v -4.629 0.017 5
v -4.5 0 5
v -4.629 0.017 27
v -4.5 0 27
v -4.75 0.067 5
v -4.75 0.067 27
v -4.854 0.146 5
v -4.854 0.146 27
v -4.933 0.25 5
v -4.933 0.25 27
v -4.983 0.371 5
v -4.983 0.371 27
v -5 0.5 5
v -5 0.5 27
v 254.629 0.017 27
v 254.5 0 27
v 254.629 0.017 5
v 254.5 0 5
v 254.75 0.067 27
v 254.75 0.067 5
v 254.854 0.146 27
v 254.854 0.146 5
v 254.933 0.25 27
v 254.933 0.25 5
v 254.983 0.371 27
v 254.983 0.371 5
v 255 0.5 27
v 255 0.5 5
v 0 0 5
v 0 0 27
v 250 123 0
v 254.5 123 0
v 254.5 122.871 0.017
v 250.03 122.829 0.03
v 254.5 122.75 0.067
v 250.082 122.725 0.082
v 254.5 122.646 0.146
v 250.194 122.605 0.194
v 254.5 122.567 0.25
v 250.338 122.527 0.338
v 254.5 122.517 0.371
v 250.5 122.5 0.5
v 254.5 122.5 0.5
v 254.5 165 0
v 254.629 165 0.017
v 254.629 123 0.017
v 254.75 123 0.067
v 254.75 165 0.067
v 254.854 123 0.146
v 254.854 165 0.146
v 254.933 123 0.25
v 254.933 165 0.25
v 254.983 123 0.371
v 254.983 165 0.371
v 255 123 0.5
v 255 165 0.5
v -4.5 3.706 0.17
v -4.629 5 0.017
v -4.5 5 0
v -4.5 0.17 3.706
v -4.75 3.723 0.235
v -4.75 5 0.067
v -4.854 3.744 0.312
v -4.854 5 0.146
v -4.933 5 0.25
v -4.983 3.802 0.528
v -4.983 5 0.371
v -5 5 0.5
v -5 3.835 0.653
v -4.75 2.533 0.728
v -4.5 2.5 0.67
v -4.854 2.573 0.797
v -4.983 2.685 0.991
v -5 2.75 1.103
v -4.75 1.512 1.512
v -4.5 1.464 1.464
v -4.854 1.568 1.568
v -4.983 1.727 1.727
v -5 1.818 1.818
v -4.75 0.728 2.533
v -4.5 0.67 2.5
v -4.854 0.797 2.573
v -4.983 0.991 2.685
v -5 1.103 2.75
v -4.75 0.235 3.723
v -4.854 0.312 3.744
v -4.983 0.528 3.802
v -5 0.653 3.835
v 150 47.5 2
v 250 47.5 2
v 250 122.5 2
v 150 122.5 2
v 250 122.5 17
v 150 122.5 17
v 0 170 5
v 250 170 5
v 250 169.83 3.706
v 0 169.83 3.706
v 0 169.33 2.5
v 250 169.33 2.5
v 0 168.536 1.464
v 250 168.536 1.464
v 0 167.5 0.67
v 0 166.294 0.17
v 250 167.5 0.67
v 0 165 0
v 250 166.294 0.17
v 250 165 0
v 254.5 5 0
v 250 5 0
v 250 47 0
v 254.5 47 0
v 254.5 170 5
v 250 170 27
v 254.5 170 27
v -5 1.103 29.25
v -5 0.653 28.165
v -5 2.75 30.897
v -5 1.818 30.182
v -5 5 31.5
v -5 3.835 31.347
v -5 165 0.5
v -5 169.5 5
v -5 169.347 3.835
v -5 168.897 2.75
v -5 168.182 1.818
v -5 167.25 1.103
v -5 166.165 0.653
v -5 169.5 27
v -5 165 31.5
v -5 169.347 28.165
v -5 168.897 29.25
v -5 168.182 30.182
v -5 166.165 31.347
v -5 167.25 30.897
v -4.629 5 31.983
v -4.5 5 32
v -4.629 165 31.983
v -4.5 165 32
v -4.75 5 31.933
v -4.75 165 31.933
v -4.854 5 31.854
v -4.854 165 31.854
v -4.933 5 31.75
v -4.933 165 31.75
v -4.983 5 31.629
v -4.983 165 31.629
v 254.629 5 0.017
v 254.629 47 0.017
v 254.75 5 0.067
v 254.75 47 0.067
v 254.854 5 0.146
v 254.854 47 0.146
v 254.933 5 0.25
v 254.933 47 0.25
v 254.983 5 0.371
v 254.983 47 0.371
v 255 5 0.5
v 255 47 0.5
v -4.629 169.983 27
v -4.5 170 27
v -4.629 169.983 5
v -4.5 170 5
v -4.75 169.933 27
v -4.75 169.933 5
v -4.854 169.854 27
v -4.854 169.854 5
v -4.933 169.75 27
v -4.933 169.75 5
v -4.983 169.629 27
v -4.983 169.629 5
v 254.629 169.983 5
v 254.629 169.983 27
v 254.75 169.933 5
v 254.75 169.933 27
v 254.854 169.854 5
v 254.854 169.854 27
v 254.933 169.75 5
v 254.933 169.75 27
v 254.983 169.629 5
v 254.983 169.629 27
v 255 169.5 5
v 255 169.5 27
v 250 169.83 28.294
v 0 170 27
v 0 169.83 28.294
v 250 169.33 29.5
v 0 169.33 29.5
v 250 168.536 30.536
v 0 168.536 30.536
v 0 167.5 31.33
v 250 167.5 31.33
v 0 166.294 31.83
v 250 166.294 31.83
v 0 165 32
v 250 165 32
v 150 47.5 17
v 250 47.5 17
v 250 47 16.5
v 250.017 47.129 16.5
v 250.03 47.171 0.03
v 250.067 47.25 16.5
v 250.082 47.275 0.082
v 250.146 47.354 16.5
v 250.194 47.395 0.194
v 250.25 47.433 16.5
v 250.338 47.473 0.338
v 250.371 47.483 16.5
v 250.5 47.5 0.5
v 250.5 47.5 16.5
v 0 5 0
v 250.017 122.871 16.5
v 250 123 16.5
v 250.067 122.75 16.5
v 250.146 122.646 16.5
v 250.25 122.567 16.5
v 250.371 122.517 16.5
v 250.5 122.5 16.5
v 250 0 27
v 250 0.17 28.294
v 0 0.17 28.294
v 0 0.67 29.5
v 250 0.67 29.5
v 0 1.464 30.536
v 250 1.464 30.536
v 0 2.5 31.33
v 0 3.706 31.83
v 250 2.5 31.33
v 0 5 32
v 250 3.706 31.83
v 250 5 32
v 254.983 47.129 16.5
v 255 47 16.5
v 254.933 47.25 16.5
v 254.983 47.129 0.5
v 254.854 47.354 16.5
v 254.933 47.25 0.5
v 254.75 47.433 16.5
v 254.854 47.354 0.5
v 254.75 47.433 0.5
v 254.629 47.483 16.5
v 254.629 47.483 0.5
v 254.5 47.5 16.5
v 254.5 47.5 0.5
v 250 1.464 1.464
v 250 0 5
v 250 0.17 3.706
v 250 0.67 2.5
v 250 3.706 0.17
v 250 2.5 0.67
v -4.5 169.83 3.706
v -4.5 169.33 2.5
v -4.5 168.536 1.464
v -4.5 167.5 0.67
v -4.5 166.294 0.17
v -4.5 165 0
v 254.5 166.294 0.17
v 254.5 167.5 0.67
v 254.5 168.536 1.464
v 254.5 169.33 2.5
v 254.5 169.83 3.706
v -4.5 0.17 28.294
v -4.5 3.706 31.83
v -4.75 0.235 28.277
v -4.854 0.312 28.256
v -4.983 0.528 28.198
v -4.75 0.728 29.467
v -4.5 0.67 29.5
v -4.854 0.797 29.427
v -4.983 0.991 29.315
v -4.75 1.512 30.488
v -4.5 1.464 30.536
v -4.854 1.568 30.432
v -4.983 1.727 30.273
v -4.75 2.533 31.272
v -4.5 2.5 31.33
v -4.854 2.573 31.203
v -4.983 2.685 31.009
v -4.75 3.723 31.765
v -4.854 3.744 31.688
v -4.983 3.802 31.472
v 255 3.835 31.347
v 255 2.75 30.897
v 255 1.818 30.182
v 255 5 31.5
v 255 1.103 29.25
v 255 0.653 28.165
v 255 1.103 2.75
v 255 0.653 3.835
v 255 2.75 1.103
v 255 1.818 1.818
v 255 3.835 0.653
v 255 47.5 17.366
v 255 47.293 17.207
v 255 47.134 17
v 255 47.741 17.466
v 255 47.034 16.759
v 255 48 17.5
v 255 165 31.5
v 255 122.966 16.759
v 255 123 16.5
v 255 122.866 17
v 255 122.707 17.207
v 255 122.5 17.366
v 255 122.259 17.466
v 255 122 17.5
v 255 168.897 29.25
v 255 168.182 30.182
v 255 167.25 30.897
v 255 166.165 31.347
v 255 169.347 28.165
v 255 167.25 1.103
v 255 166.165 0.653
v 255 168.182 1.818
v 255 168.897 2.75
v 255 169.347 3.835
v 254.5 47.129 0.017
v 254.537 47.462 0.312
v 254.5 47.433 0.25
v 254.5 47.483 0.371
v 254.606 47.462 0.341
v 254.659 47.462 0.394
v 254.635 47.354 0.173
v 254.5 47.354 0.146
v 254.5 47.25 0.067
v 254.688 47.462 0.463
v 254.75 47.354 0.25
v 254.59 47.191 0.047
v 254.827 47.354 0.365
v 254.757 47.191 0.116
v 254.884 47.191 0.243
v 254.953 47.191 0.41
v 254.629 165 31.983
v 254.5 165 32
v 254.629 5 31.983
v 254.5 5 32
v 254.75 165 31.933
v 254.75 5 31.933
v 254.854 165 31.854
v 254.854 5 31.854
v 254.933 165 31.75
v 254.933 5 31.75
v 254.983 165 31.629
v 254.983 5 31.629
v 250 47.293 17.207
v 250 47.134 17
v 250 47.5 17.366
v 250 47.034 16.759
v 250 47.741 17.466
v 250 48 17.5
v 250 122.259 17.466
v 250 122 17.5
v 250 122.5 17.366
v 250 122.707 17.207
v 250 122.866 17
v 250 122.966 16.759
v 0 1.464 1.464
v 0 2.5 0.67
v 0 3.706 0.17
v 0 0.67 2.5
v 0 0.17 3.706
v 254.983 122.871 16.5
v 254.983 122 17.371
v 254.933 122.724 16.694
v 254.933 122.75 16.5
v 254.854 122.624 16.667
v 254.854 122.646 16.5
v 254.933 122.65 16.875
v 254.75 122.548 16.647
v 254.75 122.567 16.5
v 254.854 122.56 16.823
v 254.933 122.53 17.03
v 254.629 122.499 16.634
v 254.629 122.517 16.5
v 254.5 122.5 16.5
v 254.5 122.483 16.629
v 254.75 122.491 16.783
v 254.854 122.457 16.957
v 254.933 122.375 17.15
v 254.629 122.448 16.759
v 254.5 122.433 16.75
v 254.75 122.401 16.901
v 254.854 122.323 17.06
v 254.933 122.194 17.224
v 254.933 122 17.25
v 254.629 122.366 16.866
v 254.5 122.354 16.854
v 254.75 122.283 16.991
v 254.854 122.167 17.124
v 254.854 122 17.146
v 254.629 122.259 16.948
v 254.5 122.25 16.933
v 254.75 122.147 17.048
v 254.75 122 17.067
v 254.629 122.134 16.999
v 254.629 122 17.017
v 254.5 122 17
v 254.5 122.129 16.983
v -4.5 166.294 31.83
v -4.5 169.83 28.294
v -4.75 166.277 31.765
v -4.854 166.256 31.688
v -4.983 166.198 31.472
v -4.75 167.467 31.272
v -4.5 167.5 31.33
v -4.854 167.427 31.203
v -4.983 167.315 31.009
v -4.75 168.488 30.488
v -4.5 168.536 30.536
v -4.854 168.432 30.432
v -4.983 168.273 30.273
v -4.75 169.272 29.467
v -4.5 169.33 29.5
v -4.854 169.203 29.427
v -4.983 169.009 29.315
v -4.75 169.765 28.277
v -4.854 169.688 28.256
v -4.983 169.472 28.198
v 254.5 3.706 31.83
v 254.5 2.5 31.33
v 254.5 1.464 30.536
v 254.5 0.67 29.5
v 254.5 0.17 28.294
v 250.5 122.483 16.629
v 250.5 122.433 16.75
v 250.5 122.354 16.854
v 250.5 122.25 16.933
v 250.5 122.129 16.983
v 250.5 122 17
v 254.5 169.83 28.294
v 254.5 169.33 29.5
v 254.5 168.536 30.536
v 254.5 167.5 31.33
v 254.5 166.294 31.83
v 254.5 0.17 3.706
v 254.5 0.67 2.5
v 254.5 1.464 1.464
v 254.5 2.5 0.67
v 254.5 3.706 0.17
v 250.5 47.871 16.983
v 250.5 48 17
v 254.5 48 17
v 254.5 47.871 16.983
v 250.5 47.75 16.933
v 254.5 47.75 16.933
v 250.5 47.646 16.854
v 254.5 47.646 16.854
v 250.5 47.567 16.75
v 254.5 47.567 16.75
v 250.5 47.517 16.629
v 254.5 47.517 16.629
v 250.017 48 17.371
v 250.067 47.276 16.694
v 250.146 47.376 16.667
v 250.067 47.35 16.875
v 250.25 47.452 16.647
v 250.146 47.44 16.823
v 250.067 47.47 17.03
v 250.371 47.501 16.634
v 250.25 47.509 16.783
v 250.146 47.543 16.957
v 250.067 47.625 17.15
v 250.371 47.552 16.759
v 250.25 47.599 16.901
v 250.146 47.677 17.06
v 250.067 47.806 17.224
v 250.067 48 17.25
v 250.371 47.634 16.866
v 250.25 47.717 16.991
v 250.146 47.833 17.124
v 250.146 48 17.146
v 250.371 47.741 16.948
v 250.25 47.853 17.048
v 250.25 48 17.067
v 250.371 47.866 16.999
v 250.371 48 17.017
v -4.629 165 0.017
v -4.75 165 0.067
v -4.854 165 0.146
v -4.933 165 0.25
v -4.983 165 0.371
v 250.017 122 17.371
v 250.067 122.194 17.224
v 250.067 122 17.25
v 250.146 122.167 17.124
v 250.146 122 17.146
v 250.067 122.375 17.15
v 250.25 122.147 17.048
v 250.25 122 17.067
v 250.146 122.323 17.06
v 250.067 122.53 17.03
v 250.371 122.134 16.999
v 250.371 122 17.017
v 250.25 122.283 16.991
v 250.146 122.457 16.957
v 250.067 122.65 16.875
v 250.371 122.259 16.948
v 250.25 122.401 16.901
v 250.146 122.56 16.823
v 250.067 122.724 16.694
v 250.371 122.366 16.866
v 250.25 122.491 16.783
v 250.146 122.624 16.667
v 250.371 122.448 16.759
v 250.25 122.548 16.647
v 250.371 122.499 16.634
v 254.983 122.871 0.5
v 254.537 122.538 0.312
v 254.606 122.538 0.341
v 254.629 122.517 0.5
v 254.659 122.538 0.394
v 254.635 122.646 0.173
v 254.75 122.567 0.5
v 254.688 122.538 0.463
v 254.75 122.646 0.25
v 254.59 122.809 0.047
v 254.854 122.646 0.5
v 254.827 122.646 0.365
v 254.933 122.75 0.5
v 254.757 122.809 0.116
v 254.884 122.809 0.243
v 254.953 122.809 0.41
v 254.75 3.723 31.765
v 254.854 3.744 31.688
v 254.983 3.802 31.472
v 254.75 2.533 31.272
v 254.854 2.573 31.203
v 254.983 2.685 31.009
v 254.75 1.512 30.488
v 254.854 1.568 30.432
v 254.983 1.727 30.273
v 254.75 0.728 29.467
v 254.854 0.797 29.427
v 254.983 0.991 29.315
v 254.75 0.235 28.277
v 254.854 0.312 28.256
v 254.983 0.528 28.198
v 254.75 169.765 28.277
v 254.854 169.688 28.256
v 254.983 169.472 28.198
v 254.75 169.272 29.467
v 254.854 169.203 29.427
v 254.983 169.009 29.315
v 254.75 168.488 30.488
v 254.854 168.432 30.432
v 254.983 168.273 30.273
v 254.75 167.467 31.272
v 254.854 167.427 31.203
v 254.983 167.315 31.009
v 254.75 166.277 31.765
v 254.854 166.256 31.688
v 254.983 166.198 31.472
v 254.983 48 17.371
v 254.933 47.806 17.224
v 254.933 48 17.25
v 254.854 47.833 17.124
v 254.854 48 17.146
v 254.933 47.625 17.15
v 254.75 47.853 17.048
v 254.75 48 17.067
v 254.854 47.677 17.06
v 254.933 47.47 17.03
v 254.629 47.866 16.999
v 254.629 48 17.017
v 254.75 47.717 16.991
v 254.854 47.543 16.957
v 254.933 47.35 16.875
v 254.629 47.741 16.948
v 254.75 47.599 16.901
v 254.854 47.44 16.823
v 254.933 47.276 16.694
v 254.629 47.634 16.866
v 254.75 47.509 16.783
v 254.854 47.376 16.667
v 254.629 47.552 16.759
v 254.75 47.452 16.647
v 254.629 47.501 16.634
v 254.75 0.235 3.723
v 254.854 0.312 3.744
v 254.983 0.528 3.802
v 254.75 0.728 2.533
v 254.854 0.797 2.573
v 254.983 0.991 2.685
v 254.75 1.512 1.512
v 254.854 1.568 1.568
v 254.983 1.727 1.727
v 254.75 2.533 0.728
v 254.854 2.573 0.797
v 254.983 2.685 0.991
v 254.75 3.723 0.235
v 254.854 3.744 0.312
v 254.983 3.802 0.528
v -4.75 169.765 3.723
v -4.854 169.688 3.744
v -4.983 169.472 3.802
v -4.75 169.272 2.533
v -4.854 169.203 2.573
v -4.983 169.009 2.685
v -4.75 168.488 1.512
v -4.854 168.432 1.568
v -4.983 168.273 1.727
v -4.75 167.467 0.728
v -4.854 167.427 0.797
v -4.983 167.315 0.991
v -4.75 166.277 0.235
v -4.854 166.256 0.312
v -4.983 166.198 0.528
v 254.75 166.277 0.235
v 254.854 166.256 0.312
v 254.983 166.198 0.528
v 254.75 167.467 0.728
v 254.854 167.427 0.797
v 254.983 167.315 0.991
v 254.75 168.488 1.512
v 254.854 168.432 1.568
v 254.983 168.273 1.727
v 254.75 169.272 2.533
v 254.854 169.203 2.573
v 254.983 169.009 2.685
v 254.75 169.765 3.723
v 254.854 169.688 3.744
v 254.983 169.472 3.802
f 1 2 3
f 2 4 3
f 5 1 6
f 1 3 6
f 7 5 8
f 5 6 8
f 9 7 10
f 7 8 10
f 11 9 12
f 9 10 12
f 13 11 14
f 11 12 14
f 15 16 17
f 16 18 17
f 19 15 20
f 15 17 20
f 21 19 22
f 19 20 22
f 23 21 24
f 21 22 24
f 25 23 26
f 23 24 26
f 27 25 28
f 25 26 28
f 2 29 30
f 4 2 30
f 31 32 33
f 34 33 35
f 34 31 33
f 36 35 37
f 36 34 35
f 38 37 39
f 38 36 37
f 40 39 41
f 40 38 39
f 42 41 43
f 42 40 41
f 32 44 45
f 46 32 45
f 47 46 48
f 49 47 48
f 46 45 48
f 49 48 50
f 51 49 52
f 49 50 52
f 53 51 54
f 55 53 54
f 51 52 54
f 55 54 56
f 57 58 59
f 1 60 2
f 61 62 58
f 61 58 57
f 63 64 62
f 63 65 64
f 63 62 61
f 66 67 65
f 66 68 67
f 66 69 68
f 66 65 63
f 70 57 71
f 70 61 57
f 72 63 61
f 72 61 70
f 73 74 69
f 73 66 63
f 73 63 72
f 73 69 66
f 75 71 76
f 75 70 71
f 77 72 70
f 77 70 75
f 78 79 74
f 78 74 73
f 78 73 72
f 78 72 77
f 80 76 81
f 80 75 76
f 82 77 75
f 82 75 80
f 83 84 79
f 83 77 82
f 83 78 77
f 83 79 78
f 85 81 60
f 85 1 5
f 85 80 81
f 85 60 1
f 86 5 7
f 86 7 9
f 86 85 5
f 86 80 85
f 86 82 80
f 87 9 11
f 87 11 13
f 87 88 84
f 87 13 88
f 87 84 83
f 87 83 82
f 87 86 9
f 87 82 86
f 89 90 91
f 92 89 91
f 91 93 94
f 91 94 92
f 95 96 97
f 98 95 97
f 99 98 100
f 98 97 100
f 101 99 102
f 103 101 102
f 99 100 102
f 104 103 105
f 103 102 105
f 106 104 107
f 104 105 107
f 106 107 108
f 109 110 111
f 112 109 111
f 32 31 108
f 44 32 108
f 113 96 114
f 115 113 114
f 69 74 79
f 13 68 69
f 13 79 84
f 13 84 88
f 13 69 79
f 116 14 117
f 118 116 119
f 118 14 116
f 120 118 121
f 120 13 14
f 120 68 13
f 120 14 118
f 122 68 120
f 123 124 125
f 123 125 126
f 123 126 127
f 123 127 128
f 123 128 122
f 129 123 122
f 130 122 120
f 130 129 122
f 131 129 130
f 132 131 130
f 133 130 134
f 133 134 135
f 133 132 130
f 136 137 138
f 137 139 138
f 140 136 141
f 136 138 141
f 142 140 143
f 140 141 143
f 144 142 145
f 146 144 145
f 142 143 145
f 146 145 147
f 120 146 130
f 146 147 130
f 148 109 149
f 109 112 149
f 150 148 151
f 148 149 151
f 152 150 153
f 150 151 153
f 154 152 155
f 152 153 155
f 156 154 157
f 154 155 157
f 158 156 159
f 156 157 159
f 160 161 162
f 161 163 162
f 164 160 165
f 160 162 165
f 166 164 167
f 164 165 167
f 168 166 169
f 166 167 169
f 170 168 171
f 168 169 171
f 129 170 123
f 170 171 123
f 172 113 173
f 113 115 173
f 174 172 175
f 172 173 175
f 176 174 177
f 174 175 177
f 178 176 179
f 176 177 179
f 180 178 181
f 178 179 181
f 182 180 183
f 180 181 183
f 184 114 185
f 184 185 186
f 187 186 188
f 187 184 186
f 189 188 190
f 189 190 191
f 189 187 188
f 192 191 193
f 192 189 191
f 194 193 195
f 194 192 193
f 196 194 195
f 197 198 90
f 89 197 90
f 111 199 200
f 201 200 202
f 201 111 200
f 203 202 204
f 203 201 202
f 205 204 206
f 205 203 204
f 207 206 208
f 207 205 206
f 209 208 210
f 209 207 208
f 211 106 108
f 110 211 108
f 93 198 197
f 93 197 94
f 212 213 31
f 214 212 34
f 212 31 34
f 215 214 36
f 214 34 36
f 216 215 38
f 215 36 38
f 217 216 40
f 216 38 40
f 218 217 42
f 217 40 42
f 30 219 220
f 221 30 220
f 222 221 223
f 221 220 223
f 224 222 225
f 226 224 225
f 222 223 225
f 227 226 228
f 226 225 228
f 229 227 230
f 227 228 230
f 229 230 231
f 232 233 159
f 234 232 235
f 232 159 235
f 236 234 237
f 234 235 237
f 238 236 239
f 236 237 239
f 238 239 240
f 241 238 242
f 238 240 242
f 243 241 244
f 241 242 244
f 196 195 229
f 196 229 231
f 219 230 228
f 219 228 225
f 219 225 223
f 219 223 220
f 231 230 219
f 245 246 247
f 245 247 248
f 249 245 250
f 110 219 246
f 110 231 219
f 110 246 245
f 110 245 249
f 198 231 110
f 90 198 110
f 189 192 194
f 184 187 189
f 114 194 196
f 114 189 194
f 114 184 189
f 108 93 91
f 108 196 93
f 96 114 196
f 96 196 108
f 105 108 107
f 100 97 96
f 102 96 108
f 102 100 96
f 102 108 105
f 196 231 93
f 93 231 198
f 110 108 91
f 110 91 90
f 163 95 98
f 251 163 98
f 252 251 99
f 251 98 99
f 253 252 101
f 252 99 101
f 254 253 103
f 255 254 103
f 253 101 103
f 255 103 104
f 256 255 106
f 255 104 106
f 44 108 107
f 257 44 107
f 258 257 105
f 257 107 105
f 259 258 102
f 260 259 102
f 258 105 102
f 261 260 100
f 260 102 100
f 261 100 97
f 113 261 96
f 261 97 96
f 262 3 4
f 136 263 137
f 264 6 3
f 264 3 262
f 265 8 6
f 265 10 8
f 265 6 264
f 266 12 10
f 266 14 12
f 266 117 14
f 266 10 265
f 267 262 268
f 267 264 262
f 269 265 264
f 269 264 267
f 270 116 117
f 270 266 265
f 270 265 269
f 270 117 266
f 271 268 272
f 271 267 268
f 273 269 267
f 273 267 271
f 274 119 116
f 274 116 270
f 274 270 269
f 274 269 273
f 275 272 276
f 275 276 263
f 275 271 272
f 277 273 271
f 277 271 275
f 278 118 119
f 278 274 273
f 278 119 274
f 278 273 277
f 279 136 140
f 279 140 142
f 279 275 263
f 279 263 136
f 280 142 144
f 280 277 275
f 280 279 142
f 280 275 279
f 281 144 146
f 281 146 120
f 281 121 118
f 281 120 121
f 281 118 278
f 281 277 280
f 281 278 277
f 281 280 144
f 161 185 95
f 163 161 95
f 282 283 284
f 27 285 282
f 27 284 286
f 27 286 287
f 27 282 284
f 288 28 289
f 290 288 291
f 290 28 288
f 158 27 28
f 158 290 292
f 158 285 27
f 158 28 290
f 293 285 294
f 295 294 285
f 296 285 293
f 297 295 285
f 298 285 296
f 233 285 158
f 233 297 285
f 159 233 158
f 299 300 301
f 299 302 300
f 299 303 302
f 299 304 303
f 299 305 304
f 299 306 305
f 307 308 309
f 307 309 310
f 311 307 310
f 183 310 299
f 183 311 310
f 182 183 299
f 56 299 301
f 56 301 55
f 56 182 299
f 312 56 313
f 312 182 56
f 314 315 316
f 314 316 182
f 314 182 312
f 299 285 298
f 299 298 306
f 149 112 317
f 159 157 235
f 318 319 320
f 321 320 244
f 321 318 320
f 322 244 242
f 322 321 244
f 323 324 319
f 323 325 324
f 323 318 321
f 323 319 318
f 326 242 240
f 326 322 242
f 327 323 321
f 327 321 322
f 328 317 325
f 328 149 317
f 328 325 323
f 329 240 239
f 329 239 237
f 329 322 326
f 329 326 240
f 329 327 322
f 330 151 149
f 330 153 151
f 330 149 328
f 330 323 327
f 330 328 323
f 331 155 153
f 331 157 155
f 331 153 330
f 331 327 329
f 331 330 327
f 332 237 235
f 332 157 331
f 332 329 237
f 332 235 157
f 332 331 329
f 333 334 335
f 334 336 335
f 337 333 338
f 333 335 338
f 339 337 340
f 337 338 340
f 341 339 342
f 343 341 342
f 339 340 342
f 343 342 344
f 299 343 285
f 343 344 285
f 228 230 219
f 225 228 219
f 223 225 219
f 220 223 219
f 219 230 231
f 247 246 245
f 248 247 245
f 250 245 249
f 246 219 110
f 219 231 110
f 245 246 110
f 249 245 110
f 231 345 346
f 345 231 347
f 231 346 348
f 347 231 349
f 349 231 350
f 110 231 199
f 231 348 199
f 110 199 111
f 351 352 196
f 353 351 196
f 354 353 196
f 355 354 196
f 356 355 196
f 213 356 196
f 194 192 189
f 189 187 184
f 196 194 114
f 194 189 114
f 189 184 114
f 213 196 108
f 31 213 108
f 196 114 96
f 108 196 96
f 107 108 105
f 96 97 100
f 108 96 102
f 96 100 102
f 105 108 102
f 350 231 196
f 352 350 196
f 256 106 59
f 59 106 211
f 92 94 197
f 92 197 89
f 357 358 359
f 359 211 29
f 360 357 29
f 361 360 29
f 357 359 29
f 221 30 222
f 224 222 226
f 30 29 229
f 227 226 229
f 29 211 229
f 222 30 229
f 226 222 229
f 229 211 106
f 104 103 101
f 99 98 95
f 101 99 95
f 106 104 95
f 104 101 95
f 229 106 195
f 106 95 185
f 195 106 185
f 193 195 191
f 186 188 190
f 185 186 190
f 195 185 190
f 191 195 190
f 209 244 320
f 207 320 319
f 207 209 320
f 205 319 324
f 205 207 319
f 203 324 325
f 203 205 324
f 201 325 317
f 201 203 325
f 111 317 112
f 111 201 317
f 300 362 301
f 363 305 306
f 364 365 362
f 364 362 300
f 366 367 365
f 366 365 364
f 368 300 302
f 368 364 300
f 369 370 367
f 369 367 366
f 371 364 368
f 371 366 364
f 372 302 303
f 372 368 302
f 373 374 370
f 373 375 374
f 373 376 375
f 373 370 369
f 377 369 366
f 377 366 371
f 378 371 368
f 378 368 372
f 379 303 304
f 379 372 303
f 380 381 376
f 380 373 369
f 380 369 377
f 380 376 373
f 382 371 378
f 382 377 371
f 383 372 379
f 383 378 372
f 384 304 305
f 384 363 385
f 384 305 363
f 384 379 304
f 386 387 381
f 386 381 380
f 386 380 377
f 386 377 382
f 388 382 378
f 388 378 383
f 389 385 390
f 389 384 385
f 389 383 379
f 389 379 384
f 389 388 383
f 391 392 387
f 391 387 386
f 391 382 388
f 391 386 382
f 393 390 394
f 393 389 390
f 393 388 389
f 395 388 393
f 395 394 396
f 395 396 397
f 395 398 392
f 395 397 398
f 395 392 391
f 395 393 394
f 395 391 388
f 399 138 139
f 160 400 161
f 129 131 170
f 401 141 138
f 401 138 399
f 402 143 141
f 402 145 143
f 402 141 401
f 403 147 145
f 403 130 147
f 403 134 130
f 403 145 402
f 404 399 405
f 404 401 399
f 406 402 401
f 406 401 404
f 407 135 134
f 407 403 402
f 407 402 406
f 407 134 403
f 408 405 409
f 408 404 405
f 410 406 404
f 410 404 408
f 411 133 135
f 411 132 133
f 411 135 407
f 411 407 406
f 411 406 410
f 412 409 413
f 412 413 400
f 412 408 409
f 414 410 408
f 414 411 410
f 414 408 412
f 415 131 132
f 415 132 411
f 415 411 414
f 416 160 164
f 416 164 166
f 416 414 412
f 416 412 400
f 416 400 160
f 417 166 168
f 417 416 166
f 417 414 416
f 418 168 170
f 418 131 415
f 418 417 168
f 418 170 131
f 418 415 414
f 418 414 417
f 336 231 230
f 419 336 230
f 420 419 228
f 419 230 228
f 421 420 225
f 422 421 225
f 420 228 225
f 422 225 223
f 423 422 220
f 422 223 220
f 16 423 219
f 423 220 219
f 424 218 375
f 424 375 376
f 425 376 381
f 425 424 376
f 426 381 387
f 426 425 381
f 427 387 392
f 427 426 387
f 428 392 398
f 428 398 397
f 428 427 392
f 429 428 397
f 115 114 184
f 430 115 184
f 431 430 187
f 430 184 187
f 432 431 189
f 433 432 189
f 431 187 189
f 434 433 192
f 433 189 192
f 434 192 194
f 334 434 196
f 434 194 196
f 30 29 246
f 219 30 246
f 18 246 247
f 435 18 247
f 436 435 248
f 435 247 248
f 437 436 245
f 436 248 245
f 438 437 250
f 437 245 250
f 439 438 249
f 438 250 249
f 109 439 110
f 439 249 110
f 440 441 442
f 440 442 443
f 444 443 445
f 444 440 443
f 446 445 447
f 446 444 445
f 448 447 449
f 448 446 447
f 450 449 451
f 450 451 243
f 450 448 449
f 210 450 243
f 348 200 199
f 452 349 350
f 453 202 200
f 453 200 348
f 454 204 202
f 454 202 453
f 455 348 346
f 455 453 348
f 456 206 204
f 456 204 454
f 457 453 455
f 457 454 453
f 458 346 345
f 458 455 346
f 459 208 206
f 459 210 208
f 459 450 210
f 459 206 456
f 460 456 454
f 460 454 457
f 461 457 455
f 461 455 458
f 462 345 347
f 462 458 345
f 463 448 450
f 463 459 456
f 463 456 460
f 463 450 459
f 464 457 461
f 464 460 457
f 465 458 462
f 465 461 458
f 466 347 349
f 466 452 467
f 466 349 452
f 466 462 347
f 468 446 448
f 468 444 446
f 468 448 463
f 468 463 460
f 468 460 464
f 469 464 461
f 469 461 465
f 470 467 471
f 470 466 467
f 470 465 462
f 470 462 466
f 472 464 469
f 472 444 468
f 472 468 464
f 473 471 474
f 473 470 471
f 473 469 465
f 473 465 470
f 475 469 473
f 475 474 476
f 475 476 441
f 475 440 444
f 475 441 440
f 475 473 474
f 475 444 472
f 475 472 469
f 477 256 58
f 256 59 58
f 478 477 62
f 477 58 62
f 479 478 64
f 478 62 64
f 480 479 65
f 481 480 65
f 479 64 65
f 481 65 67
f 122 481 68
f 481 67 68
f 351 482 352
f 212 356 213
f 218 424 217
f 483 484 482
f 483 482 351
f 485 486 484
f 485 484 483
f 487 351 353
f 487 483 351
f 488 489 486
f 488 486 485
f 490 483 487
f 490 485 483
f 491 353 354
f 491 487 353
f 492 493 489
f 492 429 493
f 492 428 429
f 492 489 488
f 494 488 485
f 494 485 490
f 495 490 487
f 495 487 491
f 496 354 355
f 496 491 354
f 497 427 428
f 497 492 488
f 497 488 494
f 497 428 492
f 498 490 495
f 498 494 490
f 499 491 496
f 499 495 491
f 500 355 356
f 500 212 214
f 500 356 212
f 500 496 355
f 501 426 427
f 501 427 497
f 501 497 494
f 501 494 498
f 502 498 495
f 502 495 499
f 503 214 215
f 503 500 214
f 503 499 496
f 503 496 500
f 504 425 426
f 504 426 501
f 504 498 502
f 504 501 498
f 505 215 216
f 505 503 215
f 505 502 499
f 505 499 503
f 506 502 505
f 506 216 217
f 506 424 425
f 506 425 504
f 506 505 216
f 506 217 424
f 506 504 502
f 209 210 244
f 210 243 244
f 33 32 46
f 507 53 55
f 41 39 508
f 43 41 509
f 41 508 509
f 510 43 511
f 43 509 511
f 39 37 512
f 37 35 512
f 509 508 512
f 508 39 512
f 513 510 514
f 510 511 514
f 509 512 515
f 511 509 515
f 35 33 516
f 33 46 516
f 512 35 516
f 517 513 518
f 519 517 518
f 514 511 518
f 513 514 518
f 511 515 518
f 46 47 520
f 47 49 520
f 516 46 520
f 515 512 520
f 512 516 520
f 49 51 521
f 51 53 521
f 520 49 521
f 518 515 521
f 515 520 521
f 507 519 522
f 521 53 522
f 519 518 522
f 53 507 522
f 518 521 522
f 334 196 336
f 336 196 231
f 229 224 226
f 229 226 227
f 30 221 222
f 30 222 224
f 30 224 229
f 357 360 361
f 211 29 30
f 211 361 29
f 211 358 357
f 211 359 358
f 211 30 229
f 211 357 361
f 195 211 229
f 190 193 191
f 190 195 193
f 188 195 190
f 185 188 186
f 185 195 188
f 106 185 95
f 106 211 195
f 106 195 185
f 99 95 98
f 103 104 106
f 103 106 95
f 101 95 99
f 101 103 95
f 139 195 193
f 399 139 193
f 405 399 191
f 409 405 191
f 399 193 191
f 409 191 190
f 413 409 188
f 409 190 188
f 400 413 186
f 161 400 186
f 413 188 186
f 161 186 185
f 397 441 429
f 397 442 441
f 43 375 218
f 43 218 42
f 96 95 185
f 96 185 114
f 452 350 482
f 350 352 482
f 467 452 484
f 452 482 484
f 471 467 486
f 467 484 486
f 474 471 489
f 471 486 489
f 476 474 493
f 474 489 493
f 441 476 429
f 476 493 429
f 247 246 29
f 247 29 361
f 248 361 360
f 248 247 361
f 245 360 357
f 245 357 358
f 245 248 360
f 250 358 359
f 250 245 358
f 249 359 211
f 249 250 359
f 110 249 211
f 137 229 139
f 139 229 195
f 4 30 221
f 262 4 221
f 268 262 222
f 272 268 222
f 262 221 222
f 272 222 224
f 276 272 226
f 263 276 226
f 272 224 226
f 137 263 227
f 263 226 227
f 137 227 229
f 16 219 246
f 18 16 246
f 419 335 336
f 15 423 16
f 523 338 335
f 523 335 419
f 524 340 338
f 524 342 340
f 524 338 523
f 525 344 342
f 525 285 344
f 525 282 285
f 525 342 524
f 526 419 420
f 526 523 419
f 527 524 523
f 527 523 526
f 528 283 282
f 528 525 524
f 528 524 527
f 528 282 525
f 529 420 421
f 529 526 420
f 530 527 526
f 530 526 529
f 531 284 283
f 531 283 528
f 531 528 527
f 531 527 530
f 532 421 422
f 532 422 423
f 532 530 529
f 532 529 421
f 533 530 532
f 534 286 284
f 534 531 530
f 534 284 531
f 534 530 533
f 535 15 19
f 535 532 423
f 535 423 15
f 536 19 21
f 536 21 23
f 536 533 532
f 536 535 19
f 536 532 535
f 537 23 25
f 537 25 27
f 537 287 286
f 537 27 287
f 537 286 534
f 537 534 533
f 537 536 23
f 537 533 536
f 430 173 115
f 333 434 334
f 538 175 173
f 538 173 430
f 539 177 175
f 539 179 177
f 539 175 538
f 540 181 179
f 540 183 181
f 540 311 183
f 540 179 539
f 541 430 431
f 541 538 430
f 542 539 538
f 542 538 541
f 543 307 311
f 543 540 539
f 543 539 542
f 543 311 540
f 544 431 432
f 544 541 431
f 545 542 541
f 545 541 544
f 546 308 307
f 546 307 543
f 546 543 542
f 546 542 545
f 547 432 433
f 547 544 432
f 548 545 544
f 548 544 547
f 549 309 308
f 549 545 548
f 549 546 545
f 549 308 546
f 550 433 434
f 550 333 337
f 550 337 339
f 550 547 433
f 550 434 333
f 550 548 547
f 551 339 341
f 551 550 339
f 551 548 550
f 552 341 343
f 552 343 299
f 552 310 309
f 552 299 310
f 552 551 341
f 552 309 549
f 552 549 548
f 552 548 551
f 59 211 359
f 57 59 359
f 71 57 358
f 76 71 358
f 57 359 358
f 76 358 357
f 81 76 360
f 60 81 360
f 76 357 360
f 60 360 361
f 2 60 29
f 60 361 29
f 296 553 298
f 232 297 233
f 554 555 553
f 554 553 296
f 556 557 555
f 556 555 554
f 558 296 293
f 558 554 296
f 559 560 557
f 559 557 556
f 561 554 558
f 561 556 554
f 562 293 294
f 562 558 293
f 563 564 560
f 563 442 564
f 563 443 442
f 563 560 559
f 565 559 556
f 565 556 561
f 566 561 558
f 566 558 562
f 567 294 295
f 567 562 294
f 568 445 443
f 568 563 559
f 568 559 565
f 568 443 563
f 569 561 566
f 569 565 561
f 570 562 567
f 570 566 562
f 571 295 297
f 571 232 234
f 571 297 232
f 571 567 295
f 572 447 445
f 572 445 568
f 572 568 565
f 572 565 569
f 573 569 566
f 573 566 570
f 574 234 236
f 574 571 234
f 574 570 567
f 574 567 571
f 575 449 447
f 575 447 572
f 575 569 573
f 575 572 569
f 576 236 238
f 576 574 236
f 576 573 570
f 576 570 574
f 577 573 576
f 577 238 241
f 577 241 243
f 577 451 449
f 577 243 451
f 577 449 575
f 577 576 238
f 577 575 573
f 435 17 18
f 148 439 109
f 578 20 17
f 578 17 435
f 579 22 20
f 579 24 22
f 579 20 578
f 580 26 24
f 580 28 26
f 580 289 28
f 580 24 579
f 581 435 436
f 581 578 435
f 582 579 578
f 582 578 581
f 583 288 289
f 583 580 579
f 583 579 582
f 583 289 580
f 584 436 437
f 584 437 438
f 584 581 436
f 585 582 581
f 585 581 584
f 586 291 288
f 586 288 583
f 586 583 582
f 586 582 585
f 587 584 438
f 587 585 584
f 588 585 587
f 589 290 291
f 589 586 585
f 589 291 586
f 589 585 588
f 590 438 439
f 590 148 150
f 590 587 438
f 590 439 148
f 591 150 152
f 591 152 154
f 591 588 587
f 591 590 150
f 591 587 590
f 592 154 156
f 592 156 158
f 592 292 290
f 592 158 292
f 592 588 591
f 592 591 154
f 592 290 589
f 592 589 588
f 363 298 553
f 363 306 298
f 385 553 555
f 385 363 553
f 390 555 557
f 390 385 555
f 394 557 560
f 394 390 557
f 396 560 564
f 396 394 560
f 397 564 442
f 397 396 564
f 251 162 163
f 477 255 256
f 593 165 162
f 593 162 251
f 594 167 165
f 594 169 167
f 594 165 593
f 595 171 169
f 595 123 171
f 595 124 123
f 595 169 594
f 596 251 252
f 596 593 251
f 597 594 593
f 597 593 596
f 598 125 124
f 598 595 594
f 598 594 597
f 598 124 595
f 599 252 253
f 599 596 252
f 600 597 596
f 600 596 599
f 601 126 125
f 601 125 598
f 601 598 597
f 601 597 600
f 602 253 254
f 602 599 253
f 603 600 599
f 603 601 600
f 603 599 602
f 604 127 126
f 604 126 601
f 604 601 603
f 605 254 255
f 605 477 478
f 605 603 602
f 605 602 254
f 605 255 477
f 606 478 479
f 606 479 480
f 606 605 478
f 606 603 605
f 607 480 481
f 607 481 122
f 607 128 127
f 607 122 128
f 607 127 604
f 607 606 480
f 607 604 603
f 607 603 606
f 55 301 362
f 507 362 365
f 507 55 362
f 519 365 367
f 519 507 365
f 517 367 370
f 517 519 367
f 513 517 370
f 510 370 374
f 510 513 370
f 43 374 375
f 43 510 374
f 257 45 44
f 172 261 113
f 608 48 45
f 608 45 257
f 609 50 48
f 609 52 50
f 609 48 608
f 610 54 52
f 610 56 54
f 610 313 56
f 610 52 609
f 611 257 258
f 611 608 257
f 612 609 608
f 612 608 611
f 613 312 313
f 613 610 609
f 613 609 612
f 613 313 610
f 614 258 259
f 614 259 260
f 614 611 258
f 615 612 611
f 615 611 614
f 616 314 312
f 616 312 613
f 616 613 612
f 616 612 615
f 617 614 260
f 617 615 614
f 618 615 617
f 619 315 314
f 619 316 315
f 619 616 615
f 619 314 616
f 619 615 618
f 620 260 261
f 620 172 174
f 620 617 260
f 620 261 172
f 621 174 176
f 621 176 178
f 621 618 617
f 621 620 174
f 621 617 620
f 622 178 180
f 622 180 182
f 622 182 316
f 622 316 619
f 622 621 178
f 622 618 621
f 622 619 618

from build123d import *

# Parameters (mm, degrees)
SKETCH1_W           = 255
SKETCH1_H           = 170
BOSS_EXTRUDE1_DEPTH = 32
FILLET1_R           = 5
CUT_EXTRUDE1_DEPTH  = 5
BOSS_EXTRUDE2_DEPTH = 5
SKETCH4_W           = 17
SKETCH4_H           = 75
CUT_EXTRUDE2_DEPTH  = 5
SKETCH5_W           = 15
SKETCH5_H           = 75
CUT_EXTRUDE3_DEPTH  = 100
FILLET2_R           = 0.5
BOSS_EXTRUDE3_DEPTH = 5
FILLET3_R           = 0.5


with BuildPart() as part:
    # Sketch1 → Boss-Extrude1 (new body)
    with BuildSketch(Plane.XY):
        with Locations((127.5, 85)):
            Rectangle(SKETCH1_W, SKETCH1_H)
    extrude(amount=BOSS_EXTRUDE1_DEPTH)

    # Fillet1
    fillet1_edges = [part.edges().sort_by_distance(p)[0] for p in [
        (127.5, 170, 32),
        (127.5, 170, 0),
        (127.5, 0, 0),
        (127.5, 0, 32),
    ]]
    fillet(fillet1_edges, radius=FILLET1_R)

    # Sketch2 → Cut-Extrude1 (cut)
    with BuildSketch(Plane(origin=(255, 0, 0), x_dir=(0, 0, -1), z_dir=(1, 0, 0))):
        with BuildLine():
            Line((-32, 165), (-32, 5))
            ThreePointArc((-32, 5), (-30.535533906, 1.464466094), (-27, 0))
            Line((-27, 0), (-5, 0))
            ThreePointArc((-5, 0), (-1.464466094, 1.464466094), (0, 5))
            Line((0, 5), (0, 165))
            ThreePointArc((0, 165), (-1.464466094, 168.535533906), (-5, 170))
            Line((-5, 170), (-27, 170))
            ThreePointArc((-27, 170), (-30.535533906, 168.535533906), (-32, 165))
        make_face()
    extrude(amount=-CUT_EXTRUDE1_DEPTH, mode=Mode.SUBTRACT)

    # Sketch5 → Cut-Extrude3 (cut)
    with BuildSketch(Plane(origin=(250, 0, 0), x_dir=(0, 0, -1), z_dir=(1, 0, 0))):
        with Locations((-9.5, 85)):
            Rectangle(SKETCH5_W, SKETCH5_H)
    extrude(amount=-CUT_EXTRUDE3_DEPTH, mode=Mode.SUBTRACT)


with BuildPart() as body_2:
    # Sketch3 → Boss-Extrude2 (new body)
    with BuildSketch(Plane(origin=(250, 0, 0), x_dir=(0, 0, -1), z_dir=(1, 0, 0))):
        with BuildLine():
            Line((-32, 165), (-32, 5))
            ThreePointArc((-32, 5), (-30.535533906, 1.464466094), (-27, 0))
            Line((-27, 0), (-5, 0))
            ThreePointArc((-5, 0), (-1.464466094, 1.464466094), (0, 5))
            Line((0, 5), (0, 165))
            ThreePointArc((0, 165), (-1.464466094, 168.535533906), (-5, 170))
            Line((-5, 170), (-27, 170))
            ThreePointArc((-27, 170), (-30.535533906, 168.535533906), (-32, 165))
        make_face()
    extrude(amount=BOSS_EXTRUDE2_DEPTH)

    # Sketch4 → Cut-Extrude2 (cut)
    with BuildSketch(Plane(origin=(255, 0, 0), x_dir=(0, 0, -1), z_dir=(1, 0, 0))):
        with Locations((-8.5, 85)):
            Rectangle(SKETCH4_W, SKETCH4_H)
    extrude(amount=-CUT_EXTRUDE2_DEPTH, mode=Mode.SUBTRACT)

    # Fillet2
    fillet2_edges = [body_2.edges().sort_by_distance(p)[0] for p in [
        (255, 1.464466094, 30.535533906),
        (255, 0, 16),
        (255, 1.464466094, 1.464466094),
        (255, 26.25, 0),
        (255, 143.75, 0),
        (255, 168.535533906, 1.464466094),
        (252.5, 122.5, 0),
        (250, 47.5, 8.5),
        (252.5, 47.5, 0),
        (250, 85, 17),
        (252.5, 47.5, 17),
        (250, 122.5, 8.5),
        (252.5, 122.5, 17),
        (255, 122.5, 8.5),
        (255, 170, 16),
        (255, 85, 17),
        (255, 47.5, 8.5),
        (255, 168.535533906, 30.535533906),
        (255, 85, 32),
    ]]
    fillet(fillet2_edges, radius=FILLET2_R)


with BuildPart() as body_3:
    # Sketch6 → Boss-Extrude3 (new body)
    with BuildSketch(Plane.ZY):
        with BuildLine():
            Line((5, 0), (27, 0))
            ThreePointArc((27, 0), (30.535533906, 1.464466094), (32, 5))
            Line((32, 5), (32, 165))
            ThreePointArc((32, 165), (30.535533906, 168.535533906), (27, 170))
            Line((27, 170), (5, 170))
            ThreePointArc((5, 170), (1.464466094, 168.535533906), (0, 165))
            Line((0, 165), (0, 5))
            ThreePointArc((0, 5), (1.464466094, 1.464466094), (5, 0))
        make_face()
    extrude(amount=BOSS_EXTRUDE3_DEPTH)

    # Fillet3
    fillet3_edges = [body_3.edges().sort_by_distance(p)[0] for p in [
        (-5, 1.464466094, 30.535533906),
        (-5, 85, 32),
        (-5, 168.535533906, 30.535533906),
        (-5, 170, 16),
        (-5, 168.535533906, 1.464466094),
        (-5, 85, 0),
        (-5, 1.464466094, 1.464466094),
        (-5, 0, 16),
    ]]
    fillet(fillet3_edges, radius=FILLET3_R)


solid = Compound([part.part, body_2.part, body_3.part])
